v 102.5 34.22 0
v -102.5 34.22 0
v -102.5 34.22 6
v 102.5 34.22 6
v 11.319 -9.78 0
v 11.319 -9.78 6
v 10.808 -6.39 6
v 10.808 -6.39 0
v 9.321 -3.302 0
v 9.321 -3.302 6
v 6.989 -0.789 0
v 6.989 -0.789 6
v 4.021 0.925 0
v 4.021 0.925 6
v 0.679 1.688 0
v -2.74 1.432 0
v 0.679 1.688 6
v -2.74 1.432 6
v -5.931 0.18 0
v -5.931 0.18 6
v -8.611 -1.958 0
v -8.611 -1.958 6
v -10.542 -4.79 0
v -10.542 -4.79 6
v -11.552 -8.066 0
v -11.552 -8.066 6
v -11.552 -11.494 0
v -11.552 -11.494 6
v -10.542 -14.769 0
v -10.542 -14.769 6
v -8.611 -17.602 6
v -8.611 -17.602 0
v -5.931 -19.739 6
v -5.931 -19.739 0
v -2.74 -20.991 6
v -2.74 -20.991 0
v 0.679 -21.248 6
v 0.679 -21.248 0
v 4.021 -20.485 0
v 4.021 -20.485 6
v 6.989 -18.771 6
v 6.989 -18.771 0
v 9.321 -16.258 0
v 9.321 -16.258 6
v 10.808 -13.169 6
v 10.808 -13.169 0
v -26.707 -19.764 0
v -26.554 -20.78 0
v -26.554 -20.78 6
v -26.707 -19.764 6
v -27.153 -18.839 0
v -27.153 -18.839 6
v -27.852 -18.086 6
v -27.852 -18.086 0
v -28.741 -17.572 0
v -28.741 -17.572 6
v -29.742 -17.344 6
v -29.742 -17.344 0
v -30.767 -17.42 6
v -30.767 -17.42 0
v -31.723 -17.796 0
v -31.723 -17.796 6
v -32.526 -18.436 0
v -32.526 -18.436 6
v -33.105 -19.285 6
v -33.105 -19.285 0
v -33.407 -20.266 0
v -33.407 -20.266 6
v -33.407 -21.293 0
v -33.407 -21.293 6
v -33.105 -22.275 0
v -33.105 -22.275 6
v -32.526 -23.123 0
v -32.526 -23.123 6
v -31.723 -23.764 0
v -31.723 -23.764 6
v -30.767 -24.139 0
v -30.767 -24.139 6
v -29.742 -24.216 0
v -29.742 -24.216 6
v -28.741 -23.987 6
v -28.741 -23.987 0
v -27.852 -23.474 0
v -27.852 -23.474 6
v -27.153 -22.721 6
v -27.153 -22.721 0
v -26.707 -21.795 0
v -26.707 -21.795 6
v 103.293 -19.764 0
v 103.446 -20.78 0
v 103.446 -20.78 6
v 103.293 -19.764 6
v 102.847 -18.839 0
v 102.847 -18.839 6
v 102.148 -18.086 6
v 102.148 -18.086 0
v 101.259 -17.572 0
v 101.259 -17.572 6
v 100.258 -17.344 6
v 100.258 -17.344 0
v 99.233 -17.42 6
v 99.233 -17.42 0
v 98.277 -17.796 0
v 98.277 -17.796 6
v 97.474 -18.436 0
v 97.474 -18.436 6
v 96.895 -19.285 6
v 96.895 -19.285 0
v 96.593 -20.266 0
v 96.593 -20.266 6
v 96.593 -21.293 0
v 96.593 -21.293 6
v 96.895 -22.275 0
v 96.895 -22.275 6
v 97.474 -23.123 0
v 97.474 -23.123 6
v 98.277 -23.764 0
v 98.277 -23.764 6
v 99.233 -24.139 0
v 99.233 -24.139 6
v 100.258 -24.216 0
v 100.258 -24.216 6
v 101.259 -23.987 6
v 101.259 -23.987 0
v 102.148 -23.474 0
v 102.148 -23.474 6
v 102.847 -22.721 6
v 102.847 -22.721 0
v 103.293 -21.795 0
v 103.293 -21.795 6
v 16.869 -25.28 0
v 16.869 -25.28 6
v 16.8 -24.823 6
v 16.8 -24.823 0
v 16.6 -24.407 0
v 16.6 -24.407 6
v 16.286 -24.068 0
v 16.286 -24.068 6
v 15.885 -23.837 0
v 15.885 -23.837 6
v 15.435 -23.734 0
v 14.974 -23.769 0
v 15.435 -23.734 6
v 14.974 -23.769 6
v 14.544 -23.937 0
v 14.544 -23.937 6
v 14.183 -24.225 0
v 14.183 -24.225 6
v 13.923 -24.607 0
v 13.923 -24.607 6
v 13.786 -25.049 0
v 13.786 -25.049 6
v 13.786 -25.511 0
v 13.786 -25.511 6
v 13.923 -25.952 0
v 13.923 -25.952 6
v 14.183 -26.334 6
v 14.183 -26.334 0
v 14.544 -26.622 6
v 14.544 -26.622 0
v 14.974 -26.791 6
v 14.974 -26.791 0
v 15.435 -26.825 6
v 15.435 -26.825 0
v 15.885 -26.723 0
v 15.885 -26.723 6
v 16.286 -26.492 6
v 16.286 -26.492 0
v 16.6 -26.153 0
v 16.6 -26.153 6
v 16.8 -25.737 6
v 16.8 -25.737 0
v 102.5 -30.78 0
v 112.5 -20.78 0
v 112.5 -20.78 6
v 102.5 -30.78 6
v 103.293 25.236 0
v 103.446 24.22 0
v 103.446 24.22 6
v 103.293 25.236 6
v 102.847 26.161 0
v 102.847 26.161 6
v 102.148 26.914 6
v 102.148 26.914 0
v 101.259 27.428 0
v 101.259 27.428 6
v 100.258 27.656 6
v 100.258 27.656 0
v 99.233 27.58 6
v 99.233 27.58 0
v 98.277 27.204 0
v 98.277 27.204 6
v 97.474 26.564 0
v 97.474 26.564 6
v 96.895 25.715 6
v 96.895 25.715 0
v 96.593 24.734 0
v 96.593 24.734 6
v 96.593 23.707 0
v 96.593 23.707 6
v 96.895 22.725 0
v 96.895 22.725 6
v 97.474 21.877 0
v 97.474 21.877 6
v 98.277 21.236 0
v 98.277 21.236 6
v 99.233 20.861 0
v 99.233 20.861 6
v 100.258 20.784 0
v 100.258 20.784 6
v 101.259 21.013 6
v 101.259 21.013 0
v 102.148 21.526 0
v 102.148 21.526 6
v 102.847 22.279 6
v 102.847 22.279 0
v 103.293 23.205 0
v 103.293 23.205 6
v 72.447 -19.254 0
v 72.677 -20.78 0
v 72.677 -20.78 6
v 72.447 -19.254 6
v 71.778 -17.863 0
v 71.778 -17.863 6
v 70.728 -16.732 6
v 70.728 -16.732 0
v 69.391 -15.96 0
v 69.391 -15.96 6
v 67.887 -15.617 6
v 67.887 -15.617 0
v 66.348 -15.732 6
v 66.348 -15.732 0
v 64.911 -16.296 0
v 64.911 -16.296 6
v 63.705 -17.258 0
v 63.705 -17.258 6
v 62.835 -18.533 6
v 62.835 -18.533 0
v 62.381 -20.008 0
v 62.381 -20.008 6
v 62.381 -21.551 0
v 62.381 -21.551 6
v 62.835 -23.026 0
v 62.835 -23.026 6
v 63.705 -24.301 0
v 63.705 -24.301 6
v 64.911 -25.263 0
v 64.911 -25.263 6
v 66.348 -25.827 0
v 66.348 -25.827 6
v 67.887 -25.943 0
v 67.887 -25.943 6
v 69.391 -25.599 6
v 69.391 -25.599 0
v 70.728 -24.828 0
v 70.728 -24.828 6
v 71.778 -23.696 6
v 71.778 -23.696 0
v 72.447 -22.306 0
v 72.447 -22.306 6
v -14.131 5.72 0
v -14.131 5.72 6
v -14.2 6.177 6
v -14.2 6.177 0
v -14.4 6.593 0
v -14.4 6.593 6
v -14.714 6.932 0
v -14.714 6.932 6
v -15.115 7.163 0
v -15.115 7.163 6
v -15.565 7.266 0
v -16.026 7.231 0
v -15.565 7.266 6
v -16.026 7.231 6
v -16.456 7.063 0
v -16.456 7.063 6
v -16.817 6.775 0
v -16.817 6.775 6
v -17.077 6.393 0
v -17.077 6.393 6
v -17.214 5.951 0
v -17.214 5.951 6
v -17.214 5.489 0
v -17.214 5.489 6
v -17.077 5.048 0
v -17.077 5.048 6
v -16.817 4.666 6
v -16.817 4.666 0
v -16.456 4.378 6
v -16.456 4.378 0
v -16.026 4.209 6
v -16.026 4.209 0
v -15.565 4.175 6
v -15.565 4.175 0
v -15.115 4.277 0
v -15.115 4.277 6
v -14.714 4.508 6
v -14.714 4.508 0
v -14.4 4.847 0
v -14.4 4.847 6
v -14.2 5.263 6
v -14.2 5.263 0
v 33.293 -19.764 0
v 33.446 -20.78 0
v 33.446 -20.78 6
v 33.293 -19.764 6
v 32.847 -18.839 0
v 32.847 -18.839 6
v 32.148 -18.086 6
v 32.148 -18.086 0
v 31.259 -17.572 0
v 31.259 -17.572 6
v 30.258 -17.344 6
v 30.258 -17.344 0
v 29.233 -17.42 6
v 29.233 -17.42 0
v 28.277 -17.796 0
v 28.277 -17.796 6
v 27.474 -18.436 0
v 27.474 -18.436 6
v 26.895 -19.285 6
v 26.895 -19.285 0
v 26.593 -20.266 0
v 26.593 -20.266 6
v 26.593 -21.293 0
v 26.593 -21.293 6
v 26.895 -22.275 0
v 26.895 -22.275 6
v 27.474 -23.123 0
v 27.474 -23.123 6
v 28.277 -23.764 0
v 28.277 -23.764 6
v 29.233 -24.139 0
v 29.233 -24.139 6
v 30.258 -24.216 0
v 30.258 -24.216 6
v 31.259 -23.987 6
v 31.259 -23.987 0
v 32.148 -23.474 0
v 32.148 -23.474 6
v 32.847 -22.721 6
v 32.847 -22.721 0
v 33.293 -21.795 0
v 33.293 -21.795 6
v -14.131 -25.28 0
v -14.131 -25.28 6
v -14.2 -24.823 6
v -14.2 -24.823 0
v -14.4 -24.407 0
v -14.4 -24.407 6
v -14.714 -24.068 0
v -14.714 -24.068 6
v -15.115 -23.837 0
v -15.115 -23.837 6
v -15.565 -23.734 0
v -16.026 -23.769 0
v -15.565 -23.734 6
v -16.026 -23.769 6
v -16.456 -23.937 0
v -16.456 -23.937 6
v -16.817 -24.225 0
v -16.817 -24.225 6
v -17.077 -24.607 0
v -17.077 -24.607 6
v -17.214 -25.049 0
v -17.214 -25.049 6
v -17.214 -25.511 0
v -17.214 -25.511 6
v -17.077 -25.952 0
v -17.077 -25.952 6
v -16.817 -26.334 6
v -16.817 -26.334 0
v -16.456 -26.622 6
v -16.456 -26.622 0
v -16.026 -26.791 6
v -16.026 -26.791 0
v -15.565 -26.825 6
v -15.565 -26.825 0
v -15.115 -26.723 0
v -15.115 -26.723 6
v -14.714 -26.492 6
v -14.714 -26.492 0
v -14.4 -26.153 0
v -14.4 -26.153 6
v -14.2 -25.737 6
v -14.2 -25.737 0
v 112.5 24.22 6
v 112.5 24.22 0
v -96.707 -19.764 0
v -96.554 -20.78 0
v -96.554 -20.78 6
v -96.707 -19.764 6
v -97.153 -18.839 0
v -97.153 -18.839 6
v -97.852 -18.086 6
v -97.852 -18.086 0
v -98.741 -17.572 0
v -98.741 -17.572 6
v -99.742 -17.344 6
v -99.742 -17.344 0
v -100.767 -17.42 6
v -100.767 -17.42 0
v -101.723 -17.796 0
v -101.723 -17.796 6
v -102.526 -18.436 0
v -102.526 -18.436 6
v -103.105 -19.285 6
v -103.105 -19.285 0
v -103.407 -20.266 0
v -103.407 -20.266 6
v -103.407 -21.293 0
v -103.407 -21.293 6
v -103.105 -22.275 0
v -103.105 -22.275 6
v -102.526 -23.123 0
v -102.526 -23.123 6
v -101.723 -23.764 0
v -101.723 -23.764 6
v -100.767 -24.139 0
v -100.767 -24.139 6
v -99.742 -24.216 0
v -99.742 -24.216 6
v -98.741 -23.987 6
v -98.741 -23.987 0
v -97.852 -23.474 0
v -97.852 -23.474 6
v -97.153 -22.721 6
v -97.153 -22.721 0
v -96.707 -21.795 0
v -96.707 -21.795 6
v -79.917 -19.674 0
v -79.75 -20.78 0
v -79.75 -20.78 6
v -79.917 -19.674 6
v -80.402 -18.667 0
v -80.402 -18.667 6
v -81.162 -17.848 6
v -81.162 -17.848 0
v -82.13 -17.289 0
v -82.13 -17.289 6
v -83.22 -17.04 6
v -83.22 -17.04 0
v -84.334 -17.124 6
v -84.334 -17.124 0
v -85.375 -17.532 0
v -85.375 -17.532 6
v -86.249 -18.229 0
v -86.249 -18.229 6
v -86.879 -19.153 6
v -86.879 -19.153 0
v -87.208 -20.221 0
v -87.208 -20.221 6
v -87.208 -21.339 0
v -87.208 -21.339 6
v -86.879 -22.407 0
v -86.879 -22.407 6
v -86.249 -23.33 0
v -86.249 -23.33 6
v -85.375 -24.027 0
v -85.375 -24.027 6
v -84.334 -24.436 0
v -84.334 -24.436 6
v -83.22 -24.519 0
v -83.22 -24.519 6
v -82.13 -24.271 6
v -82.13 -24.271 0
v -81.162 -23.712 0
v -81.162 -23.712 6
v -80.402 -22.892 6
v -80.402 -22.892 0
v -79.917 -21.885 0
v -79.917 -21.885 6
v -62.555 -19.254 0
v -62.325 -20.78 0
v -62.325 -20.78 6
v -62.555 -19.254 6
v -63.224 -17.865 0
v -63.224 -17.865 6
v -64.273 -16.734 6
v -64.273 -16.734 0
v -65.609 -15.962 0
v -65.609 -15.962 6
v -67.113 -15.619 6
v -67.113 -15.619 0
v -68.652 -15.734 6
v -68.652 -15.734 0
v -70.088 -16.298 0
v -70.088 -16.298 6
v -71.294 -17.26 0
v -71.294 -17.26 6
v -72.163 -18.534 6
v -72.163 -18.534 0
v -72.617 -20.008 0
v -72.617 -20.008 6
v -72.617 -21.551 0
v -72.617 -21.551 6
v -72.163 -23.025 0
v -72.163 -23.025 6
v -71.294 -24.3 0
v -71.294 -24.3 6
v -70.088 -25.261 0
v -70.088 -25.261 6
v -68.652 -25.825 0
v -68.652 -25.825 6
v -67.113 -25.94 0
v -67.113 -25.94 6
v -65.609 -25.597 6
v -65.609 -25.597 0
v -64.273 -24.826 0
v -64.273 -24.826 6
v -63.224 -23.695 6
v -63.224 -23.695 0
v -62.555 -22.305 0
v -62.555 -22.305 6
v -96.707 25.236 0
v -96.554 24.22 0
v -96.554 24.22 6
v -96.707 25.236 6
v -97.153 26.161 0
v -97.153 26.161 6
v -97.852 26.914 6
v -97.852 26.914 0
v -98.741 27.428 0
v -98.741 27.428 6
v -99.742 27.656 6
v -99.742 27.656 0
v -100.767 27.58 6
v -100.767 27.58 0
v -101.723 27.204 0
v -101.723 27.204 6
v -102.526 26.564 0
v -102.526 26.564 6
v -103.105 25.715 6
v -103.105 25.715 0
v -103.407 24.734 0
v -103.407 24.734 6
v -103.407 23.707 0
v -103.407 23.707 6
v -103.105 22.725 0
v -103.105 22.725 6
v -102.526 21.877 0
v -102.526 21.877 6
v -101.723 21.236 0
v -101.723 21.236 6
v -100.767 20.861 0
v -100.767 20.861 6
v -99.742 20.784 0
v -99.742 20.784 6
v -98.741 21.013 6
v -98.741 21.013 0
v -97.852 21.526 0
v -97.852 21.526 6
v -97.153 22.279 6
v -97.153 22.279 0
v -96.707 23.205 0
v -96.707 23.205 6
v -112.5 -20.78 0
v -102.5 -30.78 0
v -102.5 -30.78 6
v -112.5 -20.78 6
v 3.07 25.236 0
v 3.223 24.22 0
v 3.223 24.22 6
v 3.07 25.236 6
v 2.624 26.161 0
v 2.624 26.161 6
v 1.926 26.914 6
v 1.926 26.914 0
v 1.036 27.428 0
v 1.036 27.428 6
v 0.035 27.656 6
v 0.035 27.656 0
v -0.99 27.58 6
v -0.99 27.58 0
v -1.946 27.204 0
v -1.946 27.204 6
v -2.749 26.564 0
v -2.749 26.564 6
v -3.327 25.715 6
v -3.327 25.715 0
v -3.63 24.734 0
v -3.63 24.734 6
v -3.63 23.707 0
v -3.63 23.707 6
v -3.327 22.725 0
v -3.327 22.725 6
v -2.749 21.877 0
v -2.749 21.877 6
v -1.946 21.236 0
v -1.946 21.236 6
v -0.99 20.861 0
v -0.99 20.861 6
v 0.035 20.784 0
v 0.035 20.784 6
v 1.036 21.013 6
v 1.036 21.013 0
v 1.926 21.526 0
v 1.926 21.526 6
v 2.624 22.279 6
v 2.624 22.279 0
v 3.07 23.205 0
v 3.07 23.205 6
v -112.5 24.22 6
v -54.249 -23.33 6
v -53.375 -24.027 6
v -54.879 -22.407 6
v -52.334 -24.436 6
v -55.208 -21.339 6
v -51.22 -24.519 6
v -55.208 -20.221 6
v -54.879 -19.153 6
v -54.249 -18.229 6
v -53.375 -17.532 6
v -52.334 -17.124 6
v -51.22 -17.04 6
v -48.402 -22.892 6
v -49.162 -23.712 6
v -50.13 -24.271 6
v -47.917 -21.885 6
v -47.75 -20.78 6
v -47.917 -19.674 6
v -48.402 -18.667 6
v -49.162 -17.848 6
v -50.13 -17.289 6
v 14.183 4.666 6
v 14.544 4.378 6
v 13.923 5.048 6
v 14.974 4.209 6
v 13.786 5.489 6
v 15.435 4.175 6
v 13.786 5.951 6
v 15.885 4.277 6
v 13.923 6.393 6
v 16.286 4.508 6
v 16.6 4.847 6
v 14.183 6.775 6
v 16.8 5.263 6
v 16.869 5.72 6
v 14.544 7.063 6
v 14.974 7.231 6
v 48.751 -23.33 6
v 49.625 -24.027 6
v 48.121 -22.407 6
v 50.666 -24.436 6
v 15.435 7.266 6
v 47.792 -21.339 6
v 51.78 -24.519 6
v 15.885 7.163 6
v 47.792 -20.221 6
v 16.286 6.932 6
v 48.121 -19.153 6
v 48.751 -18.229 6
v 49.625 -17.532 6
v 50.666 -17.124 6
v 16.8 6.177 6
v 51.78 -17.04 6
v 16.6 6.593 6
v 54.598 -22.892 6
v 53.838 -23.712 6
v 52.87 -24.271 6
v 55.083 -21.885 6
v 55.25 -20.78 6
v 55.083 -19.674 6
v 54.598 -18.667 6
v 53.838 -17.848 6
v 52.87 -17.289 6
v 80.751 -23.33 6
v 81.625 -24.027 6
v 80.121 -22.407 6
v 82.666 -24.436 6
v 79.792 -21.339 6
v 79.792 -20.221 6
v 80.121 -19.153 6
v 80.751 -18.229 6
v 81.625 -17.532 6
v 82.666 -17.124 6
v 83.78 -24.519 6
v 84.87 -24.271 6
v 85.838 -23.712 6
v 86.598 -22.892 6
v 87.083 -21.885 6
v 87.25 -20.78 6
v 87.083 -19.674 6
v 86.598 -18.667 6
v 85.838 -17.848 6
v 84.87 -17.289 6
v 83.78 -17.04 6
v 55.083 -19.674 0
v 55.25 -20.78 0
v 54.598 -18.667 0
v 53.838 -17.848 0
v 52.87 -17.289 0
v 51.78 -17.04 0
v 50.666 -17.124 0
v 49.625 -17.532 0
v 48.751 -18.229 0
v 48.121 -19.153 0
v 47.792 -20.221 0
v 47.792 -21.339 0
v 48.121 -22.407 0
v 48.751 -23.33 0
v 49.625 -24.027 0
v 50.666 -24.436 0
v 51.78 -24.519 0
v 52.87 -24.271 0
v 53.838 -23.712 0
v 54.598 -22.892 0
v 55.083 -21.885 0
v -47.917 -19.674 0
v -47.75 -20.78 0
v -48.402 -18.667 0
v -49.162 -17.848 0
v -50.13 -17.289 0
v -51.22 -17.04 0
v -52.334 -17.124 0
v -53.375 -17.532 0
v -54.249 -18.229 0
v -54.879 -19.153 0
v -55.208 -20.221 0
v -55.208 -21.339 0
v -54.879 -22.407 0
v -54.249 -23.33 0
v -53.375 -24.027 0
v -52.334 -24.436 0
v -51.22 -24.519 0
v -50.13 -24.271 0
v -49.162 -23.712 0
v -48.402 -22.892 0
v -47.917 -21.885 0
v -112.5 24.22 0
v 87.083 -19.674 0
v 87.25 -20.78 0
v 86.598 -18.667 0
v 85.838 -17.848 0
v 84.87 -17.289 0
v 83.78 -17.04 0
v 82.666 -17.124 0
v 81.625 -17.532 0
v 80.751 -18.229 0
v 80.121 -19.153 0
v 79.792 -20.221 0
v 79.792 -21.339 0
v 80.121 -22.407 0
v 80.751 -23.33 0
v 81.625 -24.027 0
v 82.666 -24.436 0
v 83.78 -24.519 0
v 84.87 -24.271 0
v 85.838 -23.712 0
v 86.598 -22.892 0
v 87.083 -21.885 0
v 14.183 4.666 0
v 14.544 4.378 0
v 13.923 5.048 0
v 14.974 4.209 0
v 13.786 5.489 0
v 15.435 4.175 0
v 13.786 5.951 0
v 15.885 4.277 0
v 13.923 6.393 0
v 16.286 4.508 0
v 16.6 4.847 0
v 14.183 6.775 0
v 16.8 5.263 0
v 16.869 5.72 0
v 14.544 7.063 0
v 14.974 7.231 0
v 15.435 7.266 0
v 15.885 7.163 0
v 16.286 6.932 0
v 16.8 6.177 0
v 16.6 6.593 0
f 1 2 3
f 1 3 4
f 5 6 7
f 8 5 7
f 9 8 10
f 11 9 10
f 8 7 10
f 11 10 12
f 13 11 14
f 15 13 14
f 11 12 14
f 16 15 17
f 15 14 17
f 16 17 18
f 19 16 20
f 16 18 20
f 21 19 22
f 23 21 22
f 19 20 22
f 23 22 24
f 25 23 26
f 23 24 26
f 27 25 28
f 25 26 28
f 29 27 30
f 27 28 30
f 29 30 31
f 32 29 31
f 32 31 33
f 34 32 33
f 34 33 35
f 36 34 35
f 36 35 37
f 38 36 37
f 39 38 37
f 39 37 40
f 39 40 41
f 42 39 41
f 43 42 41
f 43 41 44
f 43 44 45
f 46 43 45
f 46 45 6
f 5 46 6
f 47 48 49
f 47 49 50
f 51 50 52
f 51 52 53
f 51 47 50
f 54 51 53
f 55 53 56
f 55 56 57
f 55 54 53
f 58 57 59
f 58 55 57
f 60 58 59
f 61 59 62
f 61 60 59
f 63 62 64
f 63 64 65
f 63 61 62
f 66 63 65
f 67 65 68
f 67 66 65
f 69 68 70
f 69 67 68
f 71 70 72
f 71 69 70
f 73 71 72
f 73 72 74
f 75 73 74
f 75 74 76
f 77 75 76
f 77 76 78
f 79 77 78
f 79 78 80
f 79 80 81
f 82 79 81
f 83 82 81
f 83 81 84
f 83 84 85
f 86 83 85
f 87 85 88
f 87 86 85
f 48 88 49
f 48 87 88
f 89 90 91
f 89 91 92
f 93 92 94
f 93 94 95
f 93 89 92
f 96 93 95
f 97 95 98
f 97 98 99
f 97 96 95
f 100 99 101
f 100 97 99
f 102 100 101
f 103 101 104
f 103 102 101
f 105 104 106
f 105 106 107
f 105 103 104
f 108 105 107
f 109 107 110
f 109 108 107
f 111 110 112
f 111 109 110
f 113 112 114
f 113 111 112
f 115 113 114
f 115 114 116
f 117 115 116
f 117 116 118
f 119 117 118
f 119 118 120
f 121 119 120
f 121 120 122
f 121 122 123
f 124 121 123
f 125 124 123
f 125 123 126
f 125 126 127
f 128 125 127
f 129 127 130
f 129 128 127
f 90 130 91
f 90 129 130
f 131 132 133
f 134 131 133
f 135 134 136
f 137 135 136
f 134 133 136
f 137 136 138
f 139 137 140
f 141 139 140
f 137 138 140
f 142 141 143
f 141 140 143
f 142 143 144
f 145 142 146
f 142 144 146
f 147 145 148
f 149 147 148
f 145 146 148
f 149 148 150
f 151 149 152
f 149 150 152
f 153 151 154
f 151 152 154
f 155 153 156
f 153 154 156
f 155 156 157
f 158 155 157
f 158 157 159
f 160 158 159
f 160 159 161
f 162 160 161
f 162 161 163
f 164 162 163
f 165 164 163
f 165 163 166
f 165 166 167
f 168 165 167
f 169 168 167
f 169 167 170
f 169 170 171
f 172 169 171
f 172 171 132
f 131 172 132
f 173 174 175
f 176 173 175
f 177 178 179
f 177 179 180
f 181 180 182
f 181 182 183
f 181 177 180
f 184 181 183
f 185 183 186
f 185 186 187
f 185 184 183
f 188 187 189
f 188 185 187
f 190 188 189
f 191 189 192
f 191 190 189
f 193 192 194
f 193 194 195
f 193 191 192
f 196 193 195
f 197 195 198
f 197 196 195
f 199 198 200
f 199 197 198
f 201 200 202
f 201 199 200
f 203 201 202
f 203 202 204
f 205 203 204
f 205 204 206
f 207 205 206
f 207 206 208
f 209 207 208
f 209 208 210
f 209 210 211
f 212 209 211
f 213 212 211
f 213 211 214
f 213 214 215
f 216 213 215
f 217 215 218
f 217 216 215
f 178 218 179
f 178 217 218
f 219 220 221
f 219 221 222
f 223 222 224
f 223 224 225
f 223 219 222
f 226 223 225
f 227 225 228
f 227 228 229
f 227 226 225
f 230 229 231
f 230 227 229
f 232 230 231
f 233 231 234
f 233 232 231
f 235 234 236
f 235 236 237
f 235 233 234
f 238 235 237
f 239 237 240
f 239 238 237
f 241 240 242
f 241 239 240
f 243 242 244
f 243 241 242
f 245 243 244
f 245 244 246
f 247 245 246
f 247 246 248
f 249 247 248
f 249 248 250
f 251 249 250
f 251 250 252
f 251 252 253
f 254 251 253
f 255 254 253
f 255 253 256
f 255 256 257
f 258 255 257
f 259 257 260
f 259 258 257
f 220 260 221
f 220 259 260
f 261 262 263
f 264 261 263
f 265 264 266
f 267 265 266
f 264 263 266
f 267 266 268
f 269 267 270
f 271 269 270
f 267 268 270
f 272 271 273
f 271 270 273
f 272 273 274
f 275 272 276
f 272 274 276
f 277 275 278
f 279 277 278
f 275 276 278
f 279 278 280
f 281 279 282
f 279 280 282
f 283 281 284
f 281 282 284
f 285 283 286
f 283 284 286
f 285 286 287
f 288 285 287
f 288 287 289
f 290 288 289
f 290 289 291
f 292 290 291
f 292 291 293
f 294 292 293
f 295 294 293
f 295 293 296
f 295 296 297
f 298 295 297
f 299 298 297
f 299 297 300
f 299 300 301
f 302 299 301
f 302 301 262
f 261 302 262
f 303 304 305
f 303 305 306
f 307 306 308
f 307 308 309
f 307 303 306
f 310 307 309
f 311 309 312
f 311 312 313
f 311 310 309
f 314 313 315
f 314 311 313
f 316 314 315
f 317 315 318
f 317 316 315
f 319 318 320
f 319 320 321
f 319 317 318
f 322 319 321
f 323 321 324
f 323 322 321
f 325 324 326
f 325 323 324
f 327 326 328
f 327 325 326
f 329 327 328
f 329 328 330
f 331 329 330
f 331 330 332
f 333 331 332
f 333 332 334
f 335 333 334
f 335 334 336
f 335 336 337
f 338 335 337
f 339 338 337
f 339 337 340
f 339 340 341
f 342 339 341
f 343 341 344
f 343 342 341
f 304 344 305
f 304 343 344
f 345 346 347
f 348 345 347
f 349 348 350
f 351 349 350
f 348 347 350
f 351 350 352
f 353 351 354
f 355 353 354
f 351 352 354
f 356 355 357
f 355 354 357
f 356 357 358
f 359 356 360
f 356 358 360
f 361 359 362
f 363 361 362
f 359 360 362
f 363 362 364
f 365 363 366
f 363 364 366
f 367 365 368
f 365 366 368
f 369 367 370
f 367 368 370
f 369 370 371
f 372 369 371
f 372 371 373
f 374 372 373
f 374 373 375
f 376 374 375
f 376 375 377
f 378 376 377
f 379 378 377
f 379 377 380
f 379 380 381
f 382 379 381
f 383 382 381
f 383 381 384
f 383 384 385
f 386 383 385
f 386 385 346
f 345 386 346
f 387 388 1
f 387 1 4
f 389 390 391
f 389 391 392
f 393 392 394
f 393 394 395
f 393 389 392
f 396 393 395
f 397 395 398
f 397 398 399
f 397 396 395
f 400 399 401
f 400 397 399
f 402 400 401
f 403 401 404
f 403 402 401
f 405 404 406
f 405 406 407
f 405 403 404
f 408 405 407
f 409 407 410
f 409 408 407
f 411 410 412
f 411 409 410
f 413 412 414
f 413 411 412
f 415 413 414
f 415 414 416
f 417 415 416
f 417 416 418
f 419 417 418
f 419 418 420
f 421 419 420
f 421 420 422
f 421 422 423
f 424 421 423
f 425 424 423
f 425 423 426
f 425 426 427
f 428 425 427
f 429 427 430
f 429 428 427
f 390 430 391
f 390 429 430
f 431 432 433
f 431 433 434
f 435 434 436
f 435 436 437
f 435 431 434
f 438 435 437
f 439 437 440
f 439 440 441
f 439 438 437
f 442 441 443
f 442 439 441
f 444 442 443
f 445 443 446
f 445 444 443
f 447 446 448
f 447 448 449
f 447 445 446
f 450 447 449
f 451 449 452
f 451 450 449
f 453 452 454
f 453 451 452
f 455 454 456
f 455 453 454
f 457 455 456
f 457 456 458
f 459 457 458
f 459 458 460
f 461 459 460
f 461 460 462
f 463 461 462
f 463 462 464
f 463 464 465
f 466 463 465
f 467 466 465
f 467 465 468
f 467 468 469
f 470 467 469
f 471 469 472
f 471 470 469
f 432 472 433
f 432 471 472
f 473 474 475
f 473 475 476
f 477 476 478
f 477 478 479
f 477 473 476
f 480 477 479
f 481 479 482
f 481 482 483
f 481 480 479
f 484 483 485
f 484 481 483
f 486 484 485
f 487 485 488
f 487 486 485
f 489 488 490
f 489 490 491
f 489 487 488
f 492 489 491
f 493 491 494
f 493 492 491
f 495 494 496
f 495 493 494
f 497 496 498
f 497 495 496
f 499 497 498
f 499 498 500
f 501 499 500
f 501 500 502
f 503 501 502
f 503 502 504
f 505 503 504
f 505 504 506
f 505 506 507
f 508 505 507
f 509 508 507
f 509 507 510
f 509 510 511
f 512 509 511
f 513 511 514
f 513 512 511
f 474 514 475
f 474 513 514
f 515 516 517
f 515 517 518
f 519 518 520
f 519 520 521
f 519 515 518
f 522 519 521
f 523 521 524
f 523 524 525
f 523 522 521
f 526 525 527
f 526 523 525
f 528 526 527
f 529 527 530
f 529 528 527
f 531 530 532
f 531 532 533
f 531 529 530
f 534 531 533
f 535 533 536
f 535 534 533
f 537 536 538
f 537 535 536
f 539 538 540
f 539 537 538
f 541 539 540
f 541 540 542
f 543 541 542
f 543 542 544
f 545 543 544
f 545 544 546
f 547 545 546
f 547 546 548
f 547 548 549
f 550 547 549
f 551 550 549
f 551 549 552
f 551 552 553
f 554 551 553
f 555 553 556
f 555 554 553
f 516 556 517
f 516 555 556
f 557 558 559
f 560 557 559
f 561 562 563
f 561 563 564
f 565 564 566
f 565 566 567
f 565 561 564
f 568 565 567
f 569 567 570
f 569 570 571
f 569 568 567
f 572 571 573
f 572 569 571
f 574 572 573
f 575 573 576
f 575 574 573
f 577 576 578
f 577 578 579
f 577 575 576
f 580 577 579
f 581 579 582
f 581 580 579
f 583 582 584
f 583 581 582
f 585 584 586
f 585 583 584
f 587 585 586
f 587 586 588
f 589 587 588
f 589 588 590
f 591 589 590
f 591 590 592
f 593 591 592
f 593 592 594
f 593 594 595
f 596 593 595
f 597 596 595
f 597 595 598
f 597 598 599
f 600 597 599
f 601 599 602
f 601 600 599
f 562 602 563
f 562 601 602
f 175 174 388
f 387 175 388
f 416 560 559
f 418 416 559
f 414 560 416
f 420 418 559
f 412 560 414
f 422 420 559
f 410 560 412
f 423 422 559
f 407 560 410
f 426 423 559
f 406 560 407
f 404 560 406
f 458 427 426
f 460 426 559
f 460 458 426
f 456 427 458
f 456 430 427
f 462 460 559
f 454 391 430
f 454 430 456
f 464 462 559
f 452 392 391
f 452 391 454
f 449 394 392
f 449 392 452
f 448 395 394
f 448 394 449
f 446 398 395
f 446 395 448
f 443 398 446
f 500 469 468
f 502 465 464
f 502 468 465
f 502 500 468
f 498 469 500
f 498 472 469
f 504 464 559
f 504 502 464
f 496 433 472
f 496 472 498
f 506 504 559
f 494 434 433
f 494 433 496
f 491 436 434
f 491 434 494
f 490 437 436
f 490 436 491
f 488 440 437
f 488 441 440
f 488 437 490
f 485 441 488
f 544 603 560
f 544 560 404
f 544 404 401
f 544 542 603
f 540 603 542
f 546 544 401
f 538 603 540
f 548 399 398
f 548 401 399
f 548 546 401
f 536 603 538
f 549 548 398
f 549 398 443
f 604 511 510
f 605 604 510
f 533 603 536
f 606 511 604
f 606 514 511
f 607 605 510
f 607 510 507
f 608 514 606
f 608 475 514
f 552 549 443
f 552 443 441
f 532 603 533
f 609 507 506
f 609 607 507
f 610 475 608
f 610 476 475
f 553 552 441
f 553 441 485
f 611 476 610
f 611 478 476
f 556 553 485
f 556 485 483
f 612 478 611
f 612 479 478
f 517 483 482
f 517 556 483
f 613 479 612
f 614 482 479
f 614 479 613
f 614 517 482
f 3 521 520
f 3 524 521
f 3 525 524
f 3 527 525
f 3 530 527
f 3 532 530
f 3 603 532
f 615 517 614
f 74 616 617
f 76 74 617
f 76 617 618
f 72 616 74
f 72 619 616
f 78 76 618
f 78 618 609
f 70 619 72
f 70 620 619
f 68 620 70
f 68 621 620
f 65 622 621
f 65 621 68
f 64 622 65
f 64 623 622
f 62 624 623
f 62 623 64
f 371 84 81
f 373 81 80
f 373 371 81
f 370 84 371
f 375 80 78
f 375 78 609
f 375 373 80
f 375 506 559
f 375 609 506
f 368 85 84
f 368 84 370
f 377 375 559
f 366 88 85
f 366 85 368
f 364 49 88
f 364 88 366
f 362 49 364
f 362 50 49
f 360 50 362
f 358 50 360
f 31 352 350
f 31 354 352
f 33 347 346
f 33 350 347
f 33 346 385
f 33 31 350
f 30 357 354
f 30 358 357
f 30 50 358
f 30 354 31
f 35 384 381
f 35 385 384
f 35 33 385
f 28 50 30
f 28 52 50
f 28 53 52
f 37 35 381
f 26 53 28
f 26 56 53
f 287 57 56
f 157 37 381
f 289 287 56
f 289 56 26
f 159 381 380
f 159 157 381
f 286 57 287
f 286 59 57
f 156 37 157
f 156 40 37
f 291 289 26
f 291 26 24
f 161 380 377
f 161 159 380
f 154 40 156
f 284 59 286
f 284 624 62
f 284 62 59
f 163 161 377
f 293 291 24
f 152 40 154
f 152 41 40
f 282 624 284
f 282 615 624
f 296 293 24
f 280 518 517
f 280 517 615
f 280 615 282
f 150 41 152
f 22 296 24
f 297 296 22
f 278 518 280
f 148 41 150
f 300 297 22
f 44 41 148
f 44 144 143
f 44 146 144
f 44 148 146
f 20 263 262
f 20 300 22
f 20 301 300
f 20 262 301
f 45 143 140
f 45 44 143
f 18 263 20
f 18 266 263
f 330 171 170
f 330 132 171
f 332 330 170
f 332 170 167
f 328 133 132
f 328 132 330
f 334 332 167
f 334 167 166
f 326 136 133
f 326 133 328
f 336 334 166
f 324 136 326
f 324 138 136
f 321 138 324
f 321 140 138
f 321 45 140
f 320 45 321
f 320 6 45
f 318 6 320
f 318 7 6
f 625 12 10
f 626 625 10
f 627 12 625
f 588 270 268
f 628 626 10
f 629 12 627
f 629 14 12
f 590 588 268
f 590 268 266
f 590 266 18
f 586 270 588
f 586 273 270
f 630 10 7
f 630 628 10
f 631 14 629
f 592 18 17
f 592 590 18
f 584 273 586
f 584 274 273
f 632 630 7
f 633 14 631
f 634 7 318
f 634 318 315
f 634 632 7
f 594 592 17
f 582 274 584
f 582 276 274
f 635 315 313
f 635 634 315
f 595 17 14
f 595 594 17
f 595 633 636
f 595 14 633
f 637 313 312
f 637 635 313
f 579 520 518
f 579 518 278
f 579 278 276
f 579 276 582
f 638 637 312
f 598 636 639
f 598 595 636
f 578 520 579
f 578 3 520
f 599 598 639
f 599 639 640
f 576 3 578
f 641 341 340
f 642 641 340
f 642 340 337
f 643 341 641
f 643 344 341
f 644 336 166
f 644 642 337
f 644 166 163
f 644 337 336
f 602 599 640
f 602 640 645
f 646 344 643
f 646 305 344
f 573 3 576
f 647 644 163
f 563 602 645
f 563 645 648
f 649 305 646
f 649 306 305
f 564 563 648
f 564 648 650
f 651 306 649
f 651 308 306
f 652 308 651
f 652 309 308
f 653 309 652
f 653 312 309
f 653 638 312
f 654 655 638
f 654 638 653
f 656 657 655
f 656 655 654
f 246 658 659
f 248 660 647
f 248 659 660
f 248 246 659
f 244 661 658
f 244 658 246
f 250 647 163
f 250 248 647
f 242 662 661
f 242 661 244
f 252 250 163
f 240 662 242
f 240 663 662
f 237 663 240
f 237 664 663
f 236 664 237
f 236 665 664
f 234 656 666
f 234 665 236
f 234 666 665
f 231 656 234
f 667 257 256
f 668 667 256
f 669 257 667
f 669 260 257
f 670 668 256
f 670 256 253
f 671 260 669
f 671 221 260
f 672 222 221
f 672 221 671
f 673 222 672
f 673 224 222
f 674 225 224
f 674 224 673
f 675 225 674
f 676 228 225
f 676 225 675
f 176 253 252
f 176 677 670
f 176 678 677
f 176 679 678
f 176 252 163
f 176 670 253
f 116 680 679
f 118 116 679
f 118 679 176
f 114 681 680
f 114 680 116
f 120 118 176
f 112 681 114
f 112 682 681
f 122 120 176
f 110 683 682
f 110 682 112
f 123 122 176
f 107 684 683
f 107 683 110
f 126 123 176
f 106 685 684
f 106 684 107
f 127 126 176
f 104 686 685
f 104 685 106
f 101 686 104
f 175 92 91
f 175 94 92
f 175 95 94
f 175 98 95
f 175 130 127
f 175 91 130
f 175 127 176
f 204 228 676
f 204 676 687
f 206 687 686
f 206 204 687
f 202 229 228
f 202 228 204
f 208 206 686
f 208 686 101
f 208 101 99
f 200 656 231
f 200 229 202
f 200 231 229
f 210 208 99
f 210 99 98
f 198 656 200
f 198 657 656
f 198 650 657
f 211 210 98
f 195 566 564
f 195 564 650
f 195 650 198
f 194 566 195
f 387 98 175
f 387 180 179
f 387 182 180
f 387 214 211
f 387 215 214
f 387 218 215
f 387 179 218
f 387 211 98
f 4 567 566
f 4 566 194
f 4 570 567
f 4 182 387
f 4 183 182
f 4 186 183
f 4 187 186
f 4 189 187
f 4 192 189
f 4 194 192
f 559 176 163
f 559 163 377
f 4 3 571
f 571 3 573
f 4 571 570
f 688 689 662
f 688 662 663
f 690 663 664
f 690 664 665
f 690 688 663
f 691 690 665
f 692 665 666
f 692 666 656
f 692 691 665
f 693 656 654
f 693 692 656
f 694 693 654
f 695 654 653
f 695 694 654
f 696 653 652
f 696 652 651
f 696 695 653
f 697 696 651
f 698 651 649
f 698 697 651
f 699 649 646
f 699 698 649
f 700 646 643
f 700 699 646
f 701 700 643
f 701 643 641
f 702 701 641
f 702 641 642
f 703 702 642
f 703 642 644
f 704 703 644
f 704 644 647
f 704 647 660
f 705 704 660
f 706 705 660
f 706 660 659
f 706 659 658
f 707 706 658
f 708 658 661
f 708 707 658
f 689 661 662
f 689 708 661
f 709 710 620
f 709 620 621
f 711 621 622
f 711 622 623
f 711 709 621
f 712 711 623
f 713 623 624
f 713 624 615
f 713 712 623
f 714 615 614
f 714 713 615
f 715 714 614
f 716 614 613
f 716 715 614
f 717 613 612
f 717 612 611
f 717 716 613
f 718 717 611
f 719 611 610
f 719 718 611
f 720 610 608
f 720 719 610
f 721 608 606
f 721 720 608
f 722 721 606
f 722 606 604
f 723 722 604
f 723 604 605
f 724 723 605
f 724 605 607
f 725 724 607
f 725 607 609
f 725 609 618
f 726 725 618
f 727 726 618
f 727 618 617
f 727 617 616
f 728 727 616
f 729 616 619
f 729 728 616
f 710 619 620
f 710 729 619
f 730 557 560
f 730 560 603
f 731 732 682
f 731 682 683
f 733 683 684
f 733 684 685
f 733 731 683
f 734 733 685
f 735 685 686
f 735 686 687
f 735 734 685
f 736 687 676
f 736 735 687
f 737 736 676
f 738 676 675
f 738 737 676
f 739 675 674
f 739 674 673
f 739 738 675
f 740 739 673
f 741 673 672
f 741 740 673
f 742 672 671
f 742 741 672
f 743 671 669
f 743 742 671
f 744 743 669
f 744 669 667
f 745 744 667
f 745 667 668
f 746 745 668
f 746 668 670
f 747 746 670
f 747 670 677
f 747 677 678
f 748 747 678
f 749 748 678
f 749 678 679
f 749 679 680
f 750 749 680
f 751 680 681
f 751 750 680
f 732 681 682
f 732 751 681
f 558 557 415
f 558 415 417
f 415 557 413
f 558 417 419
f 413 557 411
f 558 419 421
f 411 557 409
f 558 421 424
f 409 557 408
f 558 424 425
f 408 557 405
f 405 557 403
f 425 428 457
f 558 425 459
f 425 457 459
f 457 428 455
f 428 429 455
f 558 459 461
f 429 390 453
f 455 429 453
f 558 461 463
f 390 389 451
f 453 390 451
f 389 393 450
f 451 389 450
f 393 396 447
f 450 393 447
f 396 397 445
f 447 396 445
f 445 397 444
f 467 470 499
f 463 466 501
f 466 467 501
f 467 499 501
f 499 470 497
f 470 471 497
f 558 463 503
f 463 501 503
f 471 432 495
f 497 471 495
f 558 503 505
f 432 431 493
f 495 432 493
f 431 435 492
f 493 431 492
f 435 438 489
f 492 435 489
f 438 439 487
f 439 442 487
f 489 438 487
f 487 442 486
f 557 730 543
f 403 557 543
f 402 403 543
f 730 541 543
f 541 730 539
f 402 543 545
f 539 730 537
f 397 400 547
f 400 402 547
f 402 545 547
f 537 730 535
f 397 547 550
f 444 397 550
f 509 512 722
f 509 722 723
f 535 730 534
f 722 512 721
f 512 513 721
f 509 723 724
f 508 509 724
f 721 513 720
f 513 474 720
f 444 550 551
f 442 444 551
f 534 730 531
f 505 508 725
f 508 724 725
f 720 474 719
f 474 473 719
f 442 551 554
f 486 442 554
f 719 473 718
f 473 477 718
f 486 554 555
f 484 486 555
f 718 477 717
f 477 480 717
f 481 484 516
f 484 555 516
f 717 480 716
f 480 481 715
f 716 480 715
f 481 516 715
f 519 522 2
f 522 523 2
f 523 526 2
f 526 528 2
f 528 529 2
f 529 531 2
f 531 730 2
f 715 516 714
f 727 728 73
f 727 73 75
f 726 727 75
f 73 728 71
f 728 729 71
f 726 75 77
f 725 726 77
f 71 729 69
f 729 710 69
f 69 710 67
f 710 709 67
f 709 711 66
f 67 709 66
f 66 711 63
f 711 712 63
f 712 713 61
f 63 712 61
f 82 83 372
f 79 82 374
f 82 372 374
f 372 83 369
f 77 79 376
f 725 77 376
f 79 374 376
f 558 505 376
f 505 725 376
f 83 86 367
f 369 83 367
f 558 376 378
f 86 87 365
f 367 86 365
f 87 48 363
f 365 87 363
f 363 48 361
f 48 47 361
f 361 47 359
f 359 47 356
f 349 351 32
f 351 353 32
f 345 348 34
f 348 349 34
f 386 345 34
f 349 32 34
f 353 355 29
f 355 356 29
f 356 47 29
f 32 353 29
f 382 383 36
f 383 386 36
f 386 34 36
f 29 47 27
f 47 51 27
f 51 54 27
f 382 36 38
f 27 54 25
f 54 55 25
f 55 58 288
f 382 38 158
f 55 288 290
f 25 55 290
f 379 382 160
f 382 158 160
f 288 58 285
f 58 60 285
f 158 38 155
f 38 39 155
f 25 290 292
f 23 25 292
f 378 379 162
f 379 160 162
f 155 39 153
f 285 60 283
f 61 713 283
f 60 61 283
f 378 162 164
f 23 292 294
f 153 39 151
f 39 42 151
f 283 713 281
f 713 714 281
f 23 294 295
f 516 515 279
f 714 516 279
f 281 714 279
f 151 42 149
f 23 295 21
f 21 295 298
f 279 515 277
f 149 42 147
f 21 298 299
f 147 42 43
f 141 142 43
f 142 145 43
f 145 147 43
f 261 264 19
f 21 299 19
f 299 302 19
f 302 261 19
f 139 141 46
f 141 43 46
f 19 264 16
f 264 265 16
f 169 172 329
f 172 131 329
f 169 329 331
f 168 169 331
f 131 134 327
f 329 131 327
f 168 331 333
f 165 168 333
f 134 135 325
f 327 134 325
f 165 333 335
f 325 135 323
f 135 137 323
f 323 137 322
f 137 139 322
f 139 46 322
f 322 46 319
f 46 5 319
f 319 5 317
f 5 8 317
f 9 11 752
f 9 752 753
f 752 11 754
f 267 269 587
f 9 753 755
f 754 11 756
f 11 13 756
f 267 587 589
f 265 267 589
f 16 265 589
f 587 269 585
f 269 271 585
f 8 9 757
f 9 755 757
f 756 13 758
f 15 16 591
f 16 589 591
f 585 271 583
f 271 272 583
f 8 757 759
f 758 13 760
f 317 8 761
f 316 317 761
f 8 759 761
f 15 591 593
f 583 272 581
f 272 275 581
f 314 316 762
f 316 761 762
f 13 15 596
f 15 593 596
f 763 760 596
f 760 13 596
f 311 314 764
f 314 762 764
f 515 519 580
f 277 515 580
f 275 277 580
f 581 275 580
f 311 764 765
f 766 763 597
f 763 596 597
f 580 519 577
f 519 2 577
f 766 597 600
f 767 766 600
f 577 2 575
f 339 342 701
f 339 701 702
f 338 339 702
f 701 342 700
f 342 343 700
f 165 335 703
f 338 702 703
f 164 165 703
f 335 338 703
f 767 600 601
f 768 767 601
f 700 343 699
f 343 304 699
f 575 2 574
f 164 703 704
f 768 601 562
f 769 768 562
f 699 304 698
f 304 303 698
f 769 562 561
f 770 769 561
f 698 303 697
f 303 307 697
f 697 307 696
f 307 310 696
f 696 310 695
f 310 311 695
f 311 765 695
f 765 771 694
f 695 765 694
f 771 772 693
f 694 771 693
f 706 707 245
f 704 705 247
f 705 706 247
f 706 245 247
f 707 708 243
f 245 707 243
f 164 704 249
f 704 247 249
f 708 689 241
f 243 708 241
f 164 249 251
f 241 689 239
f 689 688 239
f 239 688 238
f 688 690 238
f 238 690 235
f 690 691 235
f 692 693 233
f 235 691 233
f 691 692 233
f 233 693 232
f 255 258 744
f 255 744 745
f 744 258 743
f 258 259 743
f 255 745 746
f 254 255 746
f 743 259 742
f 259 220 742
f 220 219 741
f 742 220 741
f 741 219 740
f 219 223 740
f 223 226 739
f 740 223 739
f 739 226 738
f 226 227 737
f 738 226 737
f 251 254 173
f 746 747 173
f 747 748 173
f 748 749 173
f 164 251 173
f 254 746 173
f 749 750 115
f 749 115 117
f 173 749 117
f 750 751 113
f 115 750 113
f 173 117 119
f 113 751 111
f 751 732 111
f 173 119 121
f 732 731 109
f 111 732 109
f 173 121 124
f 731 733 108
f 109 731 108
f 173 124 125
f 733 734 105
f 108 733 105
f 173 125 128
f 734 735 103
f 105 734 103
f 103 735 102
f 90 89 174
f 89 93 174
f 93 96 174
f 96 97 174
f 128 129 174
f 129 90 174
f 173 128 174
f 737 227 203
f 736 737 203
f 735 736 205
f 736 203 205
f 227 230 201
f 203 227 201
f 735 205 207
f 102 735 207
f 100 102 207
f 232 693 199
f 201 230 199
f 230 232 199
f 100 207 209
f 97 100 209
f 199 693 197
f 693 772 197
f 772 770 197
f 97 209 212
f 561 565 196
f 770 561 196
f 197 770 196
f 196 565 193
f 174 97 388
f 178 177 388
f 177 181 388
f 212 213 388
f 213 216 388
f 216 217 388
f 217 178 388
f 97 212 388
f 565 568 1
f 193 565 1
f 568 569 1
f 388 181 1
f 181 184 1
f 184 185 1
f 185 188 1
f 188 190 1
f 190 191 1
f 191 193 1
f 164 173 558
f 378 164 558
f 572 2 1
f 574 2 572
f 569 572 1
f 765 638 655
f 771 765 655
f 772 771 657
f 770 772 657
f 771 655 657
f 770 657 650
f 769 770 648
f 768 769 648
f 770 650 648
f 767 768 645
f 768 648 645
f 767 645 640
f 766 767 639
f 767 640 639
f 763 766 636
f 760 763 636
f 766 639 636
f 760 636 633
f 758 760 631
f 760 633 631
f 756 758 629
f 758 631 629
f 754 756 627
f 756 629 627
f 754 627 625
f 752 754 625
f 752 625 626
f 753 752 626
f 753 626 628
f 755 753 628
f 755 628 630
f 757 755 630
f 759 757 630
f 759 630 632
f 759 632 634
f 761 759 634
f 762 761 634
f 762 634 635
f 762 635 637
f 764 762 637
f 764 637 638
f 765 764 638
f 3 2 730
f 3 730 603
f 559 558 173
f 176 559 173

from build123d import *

# Parameters (mm, degrees)
SKETCH1_W           = 225
SKETCH1_H           = 65
SKETCH1_R           = 3.75
SKETCH1_R_2         = 5.177315147
SKETCH1_R_3         = 5.175
SKETCH1_R_4         = 3.445800431
BOSS_EXTRUDE1_DEPTH = 6
CHAMFER1_SIZE       = 10
CUT_EXTRUDE1_REACH  = 119.742
SKETCH3_R           = 1.55
SKETCH3_R_2         = 11.5


with BuildPart() as part:
    # Sketch1 → Boss-Extrude1 (new body)
    with BuildSketch(Plane.XY):
        with Locations((0, 1.720251483)):
            Rectangle(SKETCH1_W, SKETCH1_H)
        with Locations((83.5, -20.779748517)):
            Circle(SKETCH1_R, mode=Mode.SUBTRACT)
        with Locations((51.5, -20.779748517)):
            Circle(SKETCH1_R, mode=Mode.SUBTRACT)
        with Locations((67.5, -20.779748517)):
            Circle(SKETCH1_R_2, mode=Mode.SUBTRACT)
        with Locations((-51.5, -20.779748517)):
            Circle(SKETCH1_R, mode=Mode.SUBTRACT)
        with Locations((-83.5, -20.779748517)):
            Circle(SKETCH1_R, mode=Mode.SUBTRACT)
        with Locations((-67.5, -20.779748517)):
            Circle(SKETCH1_R_3, mode=Mode.SUBTRACT)
        with Locations((30, -20.779748517)):
            Circle(SKETCH1_R_4, mode=Mode.SUBTRACT)
        with Locations((-30, -20.779748517)):
            Circle(SKETCH1_R_4, mode=Mode.SUBTRACT)
        with Locations((100, -20.779748517)):
            Circle(SKETCH1_R_4, mode=Mode.SUBTRACT)
        with Locations((100, 24.220251483)):
            Circle(SKETCH1_R_4, mode=Mode.SUBTRACT)
        with Locations((-0.222785291, 24.220251483)):
            Circle(SKETCH1_R_4, mode=Mode.SUBTRACT)
        with Locations((-100, -20.779748517)):
            Circle(SKETCH1_R_4, mode=Mode.SUBTRACT)
        with Locations((-100, 24.220251483)):
            Circle(SKETCH1_R_4, mode=Mode.SUBTRACT)
    extrude(amount=BOSS_EXTRUDE1_DEPTH)

    # Chamfer1
    chamfer1_edges = [part.edges().sort_by_distance(p)[0] for p in [
        (112.5, 34.220251483, 3),
        (112.5, -30.779748517, 3),
        (-112.5, -30.779748517, 3),
        (-112.5, 34.220251483, 3),
    ]]
    chamfer(chamfer1_edges, length=CHAMFER1_SIZE)

    # Sketch3 → Cut-Extrude1 (cut, up to next)
    with BuildSketch(Plane.XY.offset(6), mode=Mode.PRIVATE) as cut_extrude1_sk1:
        with Locations((-15.680841051, -25.279748517)):
            Circle(SKETCH3_R)
    cut_extrude1_tool1 = extrude(cut_extrude1_sk1.sketch, amount=-CUT_EXTRUDE1_REACH, mode=Mode.PRIVATE) & part.part
    # Sketch3 → Cut-Extrude1 (cut, up to next)
    with BuildSketch(Plane.XY.offset(6), mode=Mode.PRIVATE) as cut_extrude1_sk2:
        with Locations((-15.680841051, 5.720251483)):
            Circle(SKETCH3_R)
    cut_extrude1_tool2 = extrude(cut_extrude1_sk2.sketch, amount=-CUT_EXTRUDE1_REACH, mode=Mode.PRIVATE) & part.part
    # Sketch3 → Cut-Extrude1 (cut, up to next)
    with BuildSketch(Plane.XY.offset(6), mode=Mode.PRIVATE) as cut_extrude1_sk3:
        with Locations((15.319158949, 5.720251483)):
            Circle(SKETCH3_R)
    cut_extrude1_tool3 = extrude(cut_extrude1_sk3.sketch, amount=-CUT_EXTRUDE1_REACH, mode=Mode.PRIVATE) & part.part
    # Sketch3 → Cut-Extrude1 (cut, up to next)
    with BuildSketch(Plane.XY.offset(6), mode=Mode.PRIVATE) as cut_extrude1_sk4:
        with Locations((15.319158949, -25.279748517)):
            Circle(SKETCH3_R)
    cut_extrude1_tool4 = extrude(cut_extrude1_sk4.sketch, amount=-CUT_EXTRUDE1_REACH, mode=Mode.PRIVATE) & part.part
    # Sketch3 → Cut-Extrude1 (cut, up to next)
    with BuildSketch(Plane.XY.offset(6), mode=Mode.PRIVATE) as cut_extrude1_sk5:
        with Locations((-0.180841051, -9.779748517)):
            Circle(SKETCH3_R_2)
    cut_extrude1_tool5 = extrude(cut_extrude1_sk5.sketch, amount=-CUT_EXTRUDE1_REACH, mode=Mode.PRIVATE) & part.part
    add(cut_extrude1_tool1.solids().sort_by_distance((-15.680841, -25.279749, 6))[0], mode=Mode.SUBTRACT)
    add(cut_extrude1_tool2.solids().sort_by_distance((-15.680841, 5.720251, 6))[0], mode=Mode.SUBTRACT)
    add(cut_extrude1_tool3.solids().sort_by_distance((15.319159, 5.720251, 6))[0], mode=Mode.SUBTRACT)
    add(cut_extrude1_tool4.solids().sort_by_distance((15.319159, -25.279749, 6))[0], mode=Mode.SUBTRACT)
    add(cut_extrude1_tool5.solids().sort_by_distance((-0.180841, -9.779749, 6))[0], mode=Mode.SUBTRACT)


solid = part.part
